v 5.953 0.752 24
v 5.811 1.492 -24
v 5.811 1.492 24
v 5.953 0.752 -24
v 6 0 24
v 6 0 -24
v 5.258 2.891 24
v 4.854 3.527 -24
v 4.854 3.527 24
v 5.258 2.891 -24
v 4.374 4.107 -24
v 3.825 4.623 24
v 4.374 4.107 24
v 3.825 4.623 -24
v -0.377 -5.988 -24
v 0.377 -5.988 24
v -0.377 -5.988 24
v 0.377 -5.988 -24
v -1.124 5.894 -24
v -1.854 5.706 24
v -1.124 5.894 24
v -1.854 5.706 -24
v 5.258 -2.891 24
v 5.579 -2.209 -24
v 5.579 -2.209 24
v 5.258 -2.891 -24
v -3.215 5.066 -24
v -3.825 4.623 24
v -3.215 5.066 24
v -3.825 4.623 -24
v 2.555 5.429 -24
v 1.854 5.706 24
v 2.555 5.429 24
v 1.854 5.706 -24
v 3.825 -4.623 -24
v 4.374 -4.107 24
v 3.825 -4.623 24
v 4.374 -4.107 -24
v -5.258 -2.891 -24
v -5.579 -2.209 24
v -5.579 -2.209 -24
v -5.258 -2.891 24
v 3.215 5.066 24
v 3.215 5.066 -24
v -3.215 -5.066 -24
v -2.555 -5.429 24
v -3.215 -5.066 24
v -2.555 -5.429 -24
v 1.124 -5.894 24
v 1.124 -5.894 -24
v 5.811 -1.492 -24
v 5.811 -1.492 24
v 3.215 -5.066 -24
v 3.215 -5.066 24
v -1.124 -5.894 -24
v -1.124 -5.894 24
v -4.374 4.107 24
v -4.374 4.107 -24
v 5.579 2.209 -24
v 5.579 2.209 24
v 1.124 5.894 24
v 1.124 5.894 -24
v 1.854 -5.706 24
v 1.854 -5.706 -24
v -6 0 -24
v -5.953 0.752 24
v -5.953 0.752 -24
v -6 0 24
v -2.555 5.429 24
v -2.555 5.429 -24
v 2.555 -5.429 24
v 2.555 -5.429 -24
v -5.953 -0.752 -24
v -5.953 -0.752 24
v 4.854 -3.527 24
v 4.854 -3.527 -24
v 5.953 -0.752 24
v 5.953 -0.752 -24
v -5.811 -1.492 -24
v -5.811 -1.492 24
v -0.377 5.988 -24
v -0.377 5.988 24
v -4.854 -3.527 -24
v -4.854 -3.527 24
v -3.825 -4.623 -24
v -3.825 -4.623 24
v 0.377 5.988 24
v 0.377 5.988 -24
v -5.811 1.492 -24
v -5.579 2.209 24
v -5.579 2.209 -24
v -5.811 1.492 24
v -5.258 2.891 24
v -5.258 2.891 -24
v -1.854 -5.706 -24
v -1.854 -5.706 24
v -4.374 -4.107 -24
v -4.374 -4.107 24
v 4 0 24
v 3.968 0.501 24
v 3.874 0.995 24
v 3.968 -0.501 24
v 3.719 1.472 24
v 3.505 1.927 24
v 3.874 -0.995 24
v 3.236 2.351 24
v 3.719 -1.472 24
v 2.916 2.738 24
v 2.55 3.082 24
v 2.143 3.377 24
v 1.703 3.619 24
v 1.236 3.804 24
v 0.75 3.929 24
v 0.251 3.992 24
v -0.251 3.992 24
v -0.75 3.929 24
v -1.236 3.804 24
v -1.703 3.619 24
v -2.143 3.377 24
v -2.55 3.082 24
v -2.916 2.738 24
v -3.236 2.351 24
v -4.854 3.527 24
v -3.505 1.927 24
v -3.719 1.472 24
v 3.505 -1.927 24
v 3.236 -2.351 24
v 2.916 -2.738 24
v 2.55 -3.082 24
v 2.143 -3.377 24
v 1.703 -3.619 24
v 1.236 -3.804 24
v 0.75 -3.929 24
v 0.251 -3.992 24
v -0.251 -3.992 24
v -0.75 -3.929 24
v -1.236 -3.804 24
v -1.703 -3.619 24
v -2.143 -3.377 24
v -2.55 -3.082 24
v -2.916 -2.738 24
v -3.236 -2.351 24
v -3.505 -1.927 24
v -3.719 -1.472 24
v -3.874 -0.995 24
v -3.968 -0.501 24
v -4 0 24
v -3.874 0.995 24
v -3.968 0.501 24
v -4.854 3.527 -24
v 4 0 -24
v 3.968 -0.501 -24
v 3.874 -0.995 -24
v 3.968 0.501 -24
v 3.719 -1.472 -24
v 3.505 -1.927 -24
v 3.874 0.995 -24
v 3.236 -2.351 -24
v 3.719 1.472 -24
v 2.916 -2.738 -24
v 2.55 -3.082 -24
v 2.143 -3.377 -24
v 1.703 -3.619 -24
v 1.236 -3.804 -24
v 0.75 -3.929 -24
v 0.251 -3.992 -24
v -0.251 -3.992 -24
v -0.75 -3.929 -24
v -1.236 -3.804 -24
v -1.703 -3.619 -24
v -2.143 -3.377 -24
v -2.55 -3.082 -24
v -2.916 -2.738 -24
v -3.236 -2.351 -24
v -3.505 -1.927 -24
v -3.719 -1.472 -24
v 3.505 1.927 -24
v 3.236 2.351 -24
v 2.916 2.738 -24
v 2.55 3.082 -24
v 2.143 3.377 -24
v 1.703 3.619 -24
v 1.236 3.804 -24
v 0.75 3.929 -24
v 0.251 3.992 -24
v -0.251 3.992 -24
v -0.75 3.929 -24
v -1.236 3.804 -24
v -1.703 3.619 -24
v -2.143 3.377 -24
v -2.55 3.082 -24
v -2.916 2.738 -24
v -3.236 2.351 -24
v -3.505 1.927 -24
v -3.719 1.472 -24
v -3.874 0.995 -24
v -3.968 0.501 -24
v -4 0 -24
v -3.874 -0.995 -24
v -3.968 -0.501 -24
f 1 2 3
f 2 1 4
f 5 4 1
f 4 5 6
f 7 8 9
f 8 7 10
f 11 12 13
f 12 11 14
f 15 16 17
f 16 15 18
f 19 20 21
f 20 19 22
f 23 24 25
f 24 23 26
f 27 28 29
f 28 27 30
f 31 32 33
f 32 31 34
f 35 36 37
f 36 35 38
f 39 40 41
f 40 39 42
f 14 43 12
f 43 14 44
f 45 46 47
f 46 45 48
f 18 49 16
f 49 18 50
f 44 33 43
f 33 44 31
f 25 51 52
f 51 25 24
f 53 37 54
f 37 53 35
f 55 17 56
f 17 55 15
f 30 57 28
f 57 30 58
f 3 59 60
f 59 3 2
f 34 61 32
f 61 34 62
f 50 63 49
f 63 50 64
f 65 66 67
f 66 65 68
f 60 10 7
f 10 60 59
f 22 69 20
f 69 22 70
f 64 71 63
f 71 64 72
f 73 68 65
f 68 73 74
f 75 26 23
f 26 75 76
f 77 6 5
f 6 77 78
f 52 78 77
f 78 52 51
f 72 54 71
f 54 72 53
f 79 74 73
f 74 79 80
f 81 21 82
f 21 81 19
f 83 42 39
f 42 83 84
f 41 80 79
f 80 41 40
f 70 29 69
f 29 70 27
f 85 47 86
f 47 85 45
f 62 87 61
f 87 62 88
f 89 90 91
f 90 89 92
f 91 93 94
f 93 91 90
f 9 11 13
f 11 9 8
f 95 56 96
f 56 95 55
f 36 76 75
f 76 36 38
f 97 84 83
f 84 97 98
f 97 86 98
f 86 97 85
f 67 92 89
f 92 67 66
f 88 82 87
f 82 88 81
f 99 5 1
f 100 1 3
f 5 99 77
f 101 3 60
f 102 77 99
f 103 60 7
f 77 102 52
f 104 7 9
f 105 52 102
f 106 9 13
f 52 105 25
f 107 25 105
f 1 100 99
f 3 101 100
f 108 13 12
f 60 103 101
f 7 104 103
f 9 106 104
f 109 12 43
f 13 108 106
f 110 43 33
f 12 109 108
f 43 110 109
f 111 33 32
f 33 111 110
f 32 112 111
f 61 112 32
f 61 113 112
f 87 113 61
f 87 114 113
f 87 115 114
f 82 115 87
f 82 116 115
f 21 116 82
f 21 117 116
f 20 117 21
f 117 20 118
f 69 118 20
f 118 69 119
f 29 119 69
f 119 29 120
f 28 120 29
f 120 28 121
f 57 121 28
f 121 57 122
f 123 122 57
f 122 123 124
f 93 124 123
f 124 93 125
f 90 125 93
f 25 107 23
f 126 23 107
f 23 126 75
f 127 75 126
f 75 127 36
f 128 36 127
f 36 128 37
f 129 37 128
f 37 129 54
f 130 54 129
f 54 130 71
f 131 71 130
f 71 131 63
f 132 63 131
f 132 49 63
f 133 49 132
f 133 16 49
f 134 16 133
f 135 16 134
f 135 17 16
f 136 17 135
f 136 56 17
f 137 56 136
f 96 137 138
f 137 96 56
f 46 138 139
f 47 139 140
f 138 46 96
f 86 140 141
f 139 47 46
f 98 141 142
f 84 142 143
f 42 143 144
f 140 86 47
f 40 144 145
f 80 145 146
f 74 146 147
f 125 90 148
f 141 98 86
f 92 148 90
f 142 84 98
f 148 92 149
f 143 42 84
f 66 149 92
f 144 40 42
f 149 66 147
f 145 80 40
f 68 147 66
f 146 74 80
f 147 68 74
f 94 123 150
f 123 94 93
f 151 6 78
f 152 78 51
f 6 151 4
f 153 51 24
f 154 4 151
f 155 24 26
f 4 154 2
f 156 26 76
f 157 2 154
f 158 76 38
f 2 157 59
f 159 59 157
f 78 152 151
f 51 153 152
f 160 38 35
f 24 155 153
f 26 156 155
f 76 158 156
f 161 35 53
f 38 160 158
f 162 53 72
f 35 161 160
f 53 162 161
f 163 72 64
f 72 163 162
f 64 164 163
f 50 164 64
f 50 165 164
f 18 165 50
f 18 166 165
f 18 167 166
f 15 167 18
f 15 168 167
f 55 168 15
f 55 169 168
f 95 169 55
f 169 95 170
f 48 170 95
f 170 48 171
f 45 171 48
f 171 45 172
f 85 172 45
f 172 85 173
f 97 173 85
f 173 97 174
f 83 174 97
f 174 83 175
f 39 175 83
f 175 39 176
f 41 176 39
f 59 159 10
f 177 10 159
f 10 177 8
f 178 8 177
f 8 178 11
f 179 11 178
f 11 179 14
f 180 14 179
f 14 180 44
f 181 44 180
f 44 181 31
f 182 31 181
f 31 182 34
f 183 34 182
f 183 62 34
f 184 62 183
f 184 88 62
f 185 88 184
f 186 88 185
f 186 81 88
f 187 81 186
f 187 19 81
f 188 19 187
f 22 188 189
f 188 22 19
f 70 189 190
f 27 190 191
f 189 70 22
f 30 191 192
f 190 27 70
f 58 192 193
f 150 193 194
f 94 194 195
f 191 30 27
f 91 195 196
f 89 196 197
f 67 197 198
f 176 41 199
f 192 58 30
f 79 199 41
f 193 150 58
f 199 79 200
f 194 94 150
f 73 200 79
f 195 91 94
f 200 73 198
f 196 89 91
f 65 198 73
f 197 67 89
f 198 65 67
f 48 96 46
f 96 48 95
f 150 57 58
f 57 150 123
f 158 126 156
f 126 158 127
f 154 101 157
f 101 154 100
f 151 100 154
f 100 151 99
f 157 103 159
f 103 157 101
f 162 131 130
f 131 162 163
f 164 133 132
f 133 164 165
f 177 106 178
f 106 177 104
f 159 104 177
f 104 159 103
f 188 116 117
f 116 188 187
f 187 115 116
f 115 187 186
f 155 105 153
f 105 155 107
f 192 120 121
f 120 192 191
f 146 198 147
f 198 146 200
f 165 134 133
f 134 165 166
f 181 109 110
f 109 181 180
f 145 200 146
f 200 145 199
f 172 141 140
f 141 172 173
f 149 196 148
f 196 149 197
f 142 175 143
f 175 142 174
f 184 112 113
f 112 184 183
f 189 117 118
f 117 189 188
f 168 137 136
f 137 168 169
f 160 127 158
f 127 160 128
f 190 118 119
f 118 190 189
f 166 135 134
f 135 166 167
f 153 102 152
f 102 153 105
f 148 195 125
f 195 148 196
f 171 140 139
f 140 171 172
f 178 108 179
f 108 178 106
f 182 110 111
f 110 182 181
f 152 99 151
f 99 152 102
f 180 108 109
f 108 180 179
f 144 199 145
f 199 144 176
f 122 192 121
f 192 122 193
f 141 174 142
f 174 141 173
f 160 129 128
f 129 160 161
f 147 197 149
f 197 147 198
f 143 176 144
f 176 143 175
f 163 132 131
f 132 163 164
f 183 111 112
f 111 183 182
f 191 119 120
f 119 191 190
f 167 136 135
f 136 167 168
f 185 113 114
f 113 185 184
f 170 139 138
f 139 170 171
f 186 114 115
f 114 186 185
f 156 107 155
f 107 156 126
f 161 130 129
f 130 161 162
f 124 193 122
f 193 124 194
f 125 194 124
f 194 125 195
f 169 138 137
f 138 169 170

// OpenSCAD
$fn = 50;


difference() {
	union() {
		translate(v = [0, 0, -24.0000000000]) {
			cylinder(h = 48, r = 6.0000000000);
		}
	}
	union() {
		translate(v = [0, 0, -100.0000000000]) {
			cylinder(h = 200, r = 4.0000000000);
		}
	}
}
